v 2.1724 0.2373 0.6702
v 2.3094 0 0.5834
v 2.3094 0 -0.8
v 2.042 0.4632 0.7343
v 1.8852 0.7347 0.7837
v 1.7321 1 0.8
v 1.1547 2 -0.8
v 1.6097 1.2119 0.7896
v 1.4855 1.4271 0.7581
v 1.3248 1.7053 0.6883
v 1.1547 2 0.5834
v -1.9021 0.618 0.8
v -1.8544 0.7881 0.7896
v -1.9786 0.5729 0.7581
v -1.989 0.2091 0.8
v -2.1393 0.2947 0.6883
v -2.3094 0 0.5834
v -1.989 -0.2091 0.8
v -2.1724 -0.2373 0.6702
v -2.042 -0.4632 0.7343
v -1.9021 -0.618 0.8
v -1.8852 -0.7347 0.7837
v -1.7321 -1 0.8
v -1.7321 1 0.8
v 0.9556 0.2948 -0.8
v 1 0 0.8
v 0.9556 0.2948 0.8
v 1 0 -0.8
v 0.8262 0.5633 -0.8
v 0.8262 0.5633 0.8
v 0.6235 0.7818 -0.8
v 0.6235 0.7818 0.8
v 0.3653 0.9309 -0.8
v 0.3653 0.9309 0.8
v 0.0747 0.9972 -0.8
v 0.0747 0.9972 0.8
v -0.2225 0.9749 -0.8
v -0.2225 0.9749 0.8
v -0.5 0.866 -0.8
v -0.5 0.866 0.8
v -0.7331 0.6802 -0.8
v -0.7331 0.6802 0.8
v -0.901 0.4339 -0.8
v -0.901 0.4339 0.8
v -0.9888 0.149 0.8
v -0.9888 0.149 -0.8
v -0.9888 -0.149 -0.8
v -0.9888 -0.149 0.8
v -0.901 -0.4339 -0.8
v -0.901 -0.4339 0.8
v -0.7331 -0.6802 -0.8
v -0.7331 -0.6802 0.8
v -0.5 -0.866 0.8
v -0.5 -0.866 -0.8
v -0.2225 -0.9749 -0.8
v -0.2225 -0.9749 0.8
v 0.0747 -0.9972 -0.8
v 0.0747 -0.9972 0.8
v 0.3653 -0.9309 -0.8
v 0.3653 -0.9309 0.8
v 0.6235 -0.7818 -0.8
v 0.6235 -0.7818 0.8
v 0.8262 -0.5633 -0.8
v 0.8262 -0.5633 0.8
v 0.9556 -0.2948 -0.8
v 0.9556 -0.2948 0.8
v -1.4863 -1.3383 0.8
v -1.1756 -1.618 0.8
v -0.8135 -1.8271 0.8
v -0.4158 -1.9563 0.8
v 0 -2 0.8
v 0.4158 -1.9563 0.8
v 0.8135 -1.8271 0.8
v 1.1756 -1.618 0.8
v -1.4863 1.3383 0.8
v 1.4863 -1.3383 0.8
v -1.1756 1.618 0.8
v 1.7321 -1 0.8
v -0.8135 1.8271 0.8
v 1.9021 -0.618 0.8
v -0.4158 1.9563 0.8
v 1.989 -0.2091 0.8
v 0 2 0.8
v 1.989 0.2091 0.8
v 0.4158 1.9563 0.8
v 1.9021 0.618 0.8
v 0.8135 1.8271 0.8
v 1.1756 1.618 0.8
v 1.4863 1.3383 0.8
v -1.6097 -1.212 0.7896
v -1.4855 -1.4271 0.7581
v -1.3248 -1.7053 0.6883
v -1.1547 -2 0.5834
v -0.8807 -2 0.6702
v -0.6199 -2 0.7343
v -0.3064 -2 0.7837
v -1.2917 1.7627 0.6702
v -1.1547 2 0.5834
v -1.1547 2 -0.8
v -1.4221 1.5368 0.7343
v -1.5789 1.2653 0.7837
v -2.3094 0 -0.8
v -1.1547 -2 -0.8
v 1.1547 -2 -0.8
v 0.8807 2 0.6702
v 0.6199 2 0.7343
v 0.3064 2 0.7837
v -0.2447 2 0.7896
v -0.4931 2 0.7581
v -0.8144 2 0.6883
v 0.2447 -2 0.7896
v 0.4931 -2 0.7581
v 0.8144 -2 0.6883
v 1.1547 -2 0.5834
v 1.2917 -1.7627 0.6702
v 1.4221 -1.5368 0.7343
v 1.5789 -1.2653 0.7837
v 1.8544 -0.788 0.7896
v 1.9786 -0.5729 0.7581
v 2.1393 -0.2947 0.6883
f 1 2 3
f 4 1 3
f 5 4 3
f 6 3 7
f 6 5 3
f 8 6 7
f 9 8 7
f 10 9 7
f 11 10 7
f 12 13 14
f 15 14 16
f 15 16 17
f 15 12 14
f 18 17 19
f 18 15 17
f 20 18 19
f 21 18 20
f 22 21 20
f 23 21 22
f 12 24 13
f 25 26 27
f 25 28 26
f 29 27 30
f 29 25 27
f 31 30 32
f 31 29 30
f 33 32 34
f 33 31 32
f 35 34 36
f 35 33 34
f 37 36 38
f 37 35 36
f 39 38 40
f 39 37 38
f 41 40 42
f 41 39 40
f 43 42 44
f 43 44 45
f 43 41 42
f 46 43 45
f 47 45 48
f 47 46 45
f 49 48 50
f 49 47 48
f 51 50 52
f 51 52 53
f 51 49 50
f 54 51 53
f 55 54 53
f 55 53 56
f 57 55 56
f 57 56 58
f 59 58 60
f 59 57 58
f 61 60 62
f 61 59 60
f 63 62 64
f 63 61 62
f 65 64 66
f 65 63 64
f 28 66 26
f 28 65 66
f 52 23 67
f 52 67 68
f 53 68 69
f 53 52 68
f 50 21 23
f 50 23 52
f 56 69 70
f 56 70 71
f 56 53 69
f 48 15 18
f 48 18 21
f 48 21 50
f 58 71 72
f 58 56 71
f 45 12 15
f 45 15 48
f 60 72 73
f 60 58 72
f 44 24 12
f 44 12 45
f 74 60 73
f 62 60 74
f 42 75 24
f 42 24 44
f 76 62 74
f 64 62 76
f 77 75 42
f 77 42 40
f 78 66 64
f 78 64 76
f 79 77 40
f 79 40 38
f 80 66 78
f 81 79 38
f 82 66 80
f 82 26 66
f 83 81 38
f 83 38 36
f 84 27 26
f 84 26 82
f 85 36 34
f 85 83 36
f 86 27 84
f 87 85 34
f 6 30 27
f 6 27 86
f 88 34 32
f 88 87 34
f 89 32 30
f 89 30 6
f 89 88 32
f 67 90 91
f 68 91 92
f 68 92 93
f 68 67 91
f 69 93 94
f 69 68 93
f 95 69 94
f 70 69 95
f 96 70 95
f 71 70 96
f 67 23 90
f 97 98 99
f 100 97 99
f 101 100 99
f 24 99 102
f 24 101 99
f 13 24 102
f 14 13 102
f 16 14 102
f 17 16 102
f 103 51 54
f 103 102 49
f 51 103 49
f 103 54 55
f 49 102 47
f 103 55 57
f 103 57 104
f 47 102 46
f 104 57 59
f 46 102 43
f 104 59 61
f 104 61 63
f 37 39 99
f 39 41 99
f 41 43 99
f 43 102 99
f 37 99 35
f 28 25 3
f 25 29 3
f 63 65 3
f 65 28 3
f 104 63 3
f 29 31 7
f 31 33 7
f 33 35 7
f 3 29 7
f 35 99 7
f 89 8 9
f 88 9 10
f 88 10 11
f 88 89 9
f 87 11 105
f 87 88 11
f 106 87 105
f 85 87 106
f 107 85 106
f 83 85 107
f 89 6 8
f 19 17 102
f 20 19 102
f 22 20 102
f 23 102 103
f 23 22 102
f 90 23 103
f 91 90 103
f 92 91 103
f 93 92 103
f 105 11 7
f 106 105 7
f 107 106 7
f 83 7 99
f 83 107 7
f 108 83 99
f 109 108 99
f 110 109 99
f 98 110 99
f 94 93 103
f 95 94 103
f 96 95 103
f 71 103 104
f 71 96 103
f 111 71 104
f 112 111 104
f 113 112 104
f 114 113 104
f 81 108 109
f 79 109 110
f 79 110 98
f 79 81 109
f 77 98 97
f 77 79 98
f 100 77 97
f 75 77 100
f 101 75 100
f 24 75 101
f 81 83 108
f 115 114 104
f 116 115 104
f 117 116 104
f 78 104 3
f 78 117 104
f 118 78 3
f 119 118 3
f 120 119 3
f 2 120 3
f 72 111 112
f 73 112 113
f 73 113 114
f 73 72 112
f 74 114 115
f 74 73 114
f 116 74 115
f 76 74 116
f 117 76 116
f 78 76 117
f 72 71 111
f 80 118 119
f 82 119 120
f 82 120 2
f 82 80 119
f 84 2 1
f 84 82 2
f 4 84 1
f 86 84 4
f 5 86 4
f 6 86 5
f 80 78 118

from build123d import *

# Parameters (mm, degrees)
SKETCH_2_R          = 1
EXTRUDE_1_DEPTH     = 0.8
CUT_EXTRUDE_START   = 0.8
SKETCH_4_R          = 2.618802154
SKETCH_4_R_2        = 2
CUT_EXTRUDE_1_DEPTH = 1
CUT_EXTRUDE_1_DRAFT = -55


with BuildPart() as part:
    # 草图2 → 凸台-拉伸1 (new, symmetric)
    with BuildSketch(Plane.XY):
        Polygon((1.154700538, 2), (-1.154700538, 2), (-2.309401077, 0), (-1.154700538, -2), (1.154700538, -2), (2.309401077, 0), align=None)
        Circle(SKETCH_2_R, mode=Mode.SUBTRACT)
    extrude(amount=EXTRUDE_1_DEPTH, both=True)


with BuildPart() as cut_extrude_1_tool:
    # 草图4 → 切除-拉伸1 (with draft: the straight prism first)
    with BuildSketch(Plane.XY.offset(CUT_EXTRUDE_START)):
        Circle(SKETCH_4_R)
        Circle(SKETCH_4_R_2, mode=Mode.SUBTRACT)
    extrude(amount=-CUT_EXTRUDE_1_DEPTH)
    # 切除-拉伸1: the draft: its side faces are tilted about the plane it starts from
    cut_extrude_1_sides = [cut_extrude_1_tool.faces().sort_by_distance(p)[0] for p in [
        (-2.618802154, 0, 0.3),
        (-2, 0, 0.3),
    ]]
    draft(cut_extrude_1_sides, Plane.XY.offset(CUT_EXTRUDE_START), CUT_EXTRUDE_1_DRAFT)


with BuildPart() as part_1:
    add(part.part)

    # 切除-拉伸1: cut by cut_extrude_1_tool
    add(cut_extrude_1_tool.part, mode=Mode.SUBTRACT)


solid = part_1.part
